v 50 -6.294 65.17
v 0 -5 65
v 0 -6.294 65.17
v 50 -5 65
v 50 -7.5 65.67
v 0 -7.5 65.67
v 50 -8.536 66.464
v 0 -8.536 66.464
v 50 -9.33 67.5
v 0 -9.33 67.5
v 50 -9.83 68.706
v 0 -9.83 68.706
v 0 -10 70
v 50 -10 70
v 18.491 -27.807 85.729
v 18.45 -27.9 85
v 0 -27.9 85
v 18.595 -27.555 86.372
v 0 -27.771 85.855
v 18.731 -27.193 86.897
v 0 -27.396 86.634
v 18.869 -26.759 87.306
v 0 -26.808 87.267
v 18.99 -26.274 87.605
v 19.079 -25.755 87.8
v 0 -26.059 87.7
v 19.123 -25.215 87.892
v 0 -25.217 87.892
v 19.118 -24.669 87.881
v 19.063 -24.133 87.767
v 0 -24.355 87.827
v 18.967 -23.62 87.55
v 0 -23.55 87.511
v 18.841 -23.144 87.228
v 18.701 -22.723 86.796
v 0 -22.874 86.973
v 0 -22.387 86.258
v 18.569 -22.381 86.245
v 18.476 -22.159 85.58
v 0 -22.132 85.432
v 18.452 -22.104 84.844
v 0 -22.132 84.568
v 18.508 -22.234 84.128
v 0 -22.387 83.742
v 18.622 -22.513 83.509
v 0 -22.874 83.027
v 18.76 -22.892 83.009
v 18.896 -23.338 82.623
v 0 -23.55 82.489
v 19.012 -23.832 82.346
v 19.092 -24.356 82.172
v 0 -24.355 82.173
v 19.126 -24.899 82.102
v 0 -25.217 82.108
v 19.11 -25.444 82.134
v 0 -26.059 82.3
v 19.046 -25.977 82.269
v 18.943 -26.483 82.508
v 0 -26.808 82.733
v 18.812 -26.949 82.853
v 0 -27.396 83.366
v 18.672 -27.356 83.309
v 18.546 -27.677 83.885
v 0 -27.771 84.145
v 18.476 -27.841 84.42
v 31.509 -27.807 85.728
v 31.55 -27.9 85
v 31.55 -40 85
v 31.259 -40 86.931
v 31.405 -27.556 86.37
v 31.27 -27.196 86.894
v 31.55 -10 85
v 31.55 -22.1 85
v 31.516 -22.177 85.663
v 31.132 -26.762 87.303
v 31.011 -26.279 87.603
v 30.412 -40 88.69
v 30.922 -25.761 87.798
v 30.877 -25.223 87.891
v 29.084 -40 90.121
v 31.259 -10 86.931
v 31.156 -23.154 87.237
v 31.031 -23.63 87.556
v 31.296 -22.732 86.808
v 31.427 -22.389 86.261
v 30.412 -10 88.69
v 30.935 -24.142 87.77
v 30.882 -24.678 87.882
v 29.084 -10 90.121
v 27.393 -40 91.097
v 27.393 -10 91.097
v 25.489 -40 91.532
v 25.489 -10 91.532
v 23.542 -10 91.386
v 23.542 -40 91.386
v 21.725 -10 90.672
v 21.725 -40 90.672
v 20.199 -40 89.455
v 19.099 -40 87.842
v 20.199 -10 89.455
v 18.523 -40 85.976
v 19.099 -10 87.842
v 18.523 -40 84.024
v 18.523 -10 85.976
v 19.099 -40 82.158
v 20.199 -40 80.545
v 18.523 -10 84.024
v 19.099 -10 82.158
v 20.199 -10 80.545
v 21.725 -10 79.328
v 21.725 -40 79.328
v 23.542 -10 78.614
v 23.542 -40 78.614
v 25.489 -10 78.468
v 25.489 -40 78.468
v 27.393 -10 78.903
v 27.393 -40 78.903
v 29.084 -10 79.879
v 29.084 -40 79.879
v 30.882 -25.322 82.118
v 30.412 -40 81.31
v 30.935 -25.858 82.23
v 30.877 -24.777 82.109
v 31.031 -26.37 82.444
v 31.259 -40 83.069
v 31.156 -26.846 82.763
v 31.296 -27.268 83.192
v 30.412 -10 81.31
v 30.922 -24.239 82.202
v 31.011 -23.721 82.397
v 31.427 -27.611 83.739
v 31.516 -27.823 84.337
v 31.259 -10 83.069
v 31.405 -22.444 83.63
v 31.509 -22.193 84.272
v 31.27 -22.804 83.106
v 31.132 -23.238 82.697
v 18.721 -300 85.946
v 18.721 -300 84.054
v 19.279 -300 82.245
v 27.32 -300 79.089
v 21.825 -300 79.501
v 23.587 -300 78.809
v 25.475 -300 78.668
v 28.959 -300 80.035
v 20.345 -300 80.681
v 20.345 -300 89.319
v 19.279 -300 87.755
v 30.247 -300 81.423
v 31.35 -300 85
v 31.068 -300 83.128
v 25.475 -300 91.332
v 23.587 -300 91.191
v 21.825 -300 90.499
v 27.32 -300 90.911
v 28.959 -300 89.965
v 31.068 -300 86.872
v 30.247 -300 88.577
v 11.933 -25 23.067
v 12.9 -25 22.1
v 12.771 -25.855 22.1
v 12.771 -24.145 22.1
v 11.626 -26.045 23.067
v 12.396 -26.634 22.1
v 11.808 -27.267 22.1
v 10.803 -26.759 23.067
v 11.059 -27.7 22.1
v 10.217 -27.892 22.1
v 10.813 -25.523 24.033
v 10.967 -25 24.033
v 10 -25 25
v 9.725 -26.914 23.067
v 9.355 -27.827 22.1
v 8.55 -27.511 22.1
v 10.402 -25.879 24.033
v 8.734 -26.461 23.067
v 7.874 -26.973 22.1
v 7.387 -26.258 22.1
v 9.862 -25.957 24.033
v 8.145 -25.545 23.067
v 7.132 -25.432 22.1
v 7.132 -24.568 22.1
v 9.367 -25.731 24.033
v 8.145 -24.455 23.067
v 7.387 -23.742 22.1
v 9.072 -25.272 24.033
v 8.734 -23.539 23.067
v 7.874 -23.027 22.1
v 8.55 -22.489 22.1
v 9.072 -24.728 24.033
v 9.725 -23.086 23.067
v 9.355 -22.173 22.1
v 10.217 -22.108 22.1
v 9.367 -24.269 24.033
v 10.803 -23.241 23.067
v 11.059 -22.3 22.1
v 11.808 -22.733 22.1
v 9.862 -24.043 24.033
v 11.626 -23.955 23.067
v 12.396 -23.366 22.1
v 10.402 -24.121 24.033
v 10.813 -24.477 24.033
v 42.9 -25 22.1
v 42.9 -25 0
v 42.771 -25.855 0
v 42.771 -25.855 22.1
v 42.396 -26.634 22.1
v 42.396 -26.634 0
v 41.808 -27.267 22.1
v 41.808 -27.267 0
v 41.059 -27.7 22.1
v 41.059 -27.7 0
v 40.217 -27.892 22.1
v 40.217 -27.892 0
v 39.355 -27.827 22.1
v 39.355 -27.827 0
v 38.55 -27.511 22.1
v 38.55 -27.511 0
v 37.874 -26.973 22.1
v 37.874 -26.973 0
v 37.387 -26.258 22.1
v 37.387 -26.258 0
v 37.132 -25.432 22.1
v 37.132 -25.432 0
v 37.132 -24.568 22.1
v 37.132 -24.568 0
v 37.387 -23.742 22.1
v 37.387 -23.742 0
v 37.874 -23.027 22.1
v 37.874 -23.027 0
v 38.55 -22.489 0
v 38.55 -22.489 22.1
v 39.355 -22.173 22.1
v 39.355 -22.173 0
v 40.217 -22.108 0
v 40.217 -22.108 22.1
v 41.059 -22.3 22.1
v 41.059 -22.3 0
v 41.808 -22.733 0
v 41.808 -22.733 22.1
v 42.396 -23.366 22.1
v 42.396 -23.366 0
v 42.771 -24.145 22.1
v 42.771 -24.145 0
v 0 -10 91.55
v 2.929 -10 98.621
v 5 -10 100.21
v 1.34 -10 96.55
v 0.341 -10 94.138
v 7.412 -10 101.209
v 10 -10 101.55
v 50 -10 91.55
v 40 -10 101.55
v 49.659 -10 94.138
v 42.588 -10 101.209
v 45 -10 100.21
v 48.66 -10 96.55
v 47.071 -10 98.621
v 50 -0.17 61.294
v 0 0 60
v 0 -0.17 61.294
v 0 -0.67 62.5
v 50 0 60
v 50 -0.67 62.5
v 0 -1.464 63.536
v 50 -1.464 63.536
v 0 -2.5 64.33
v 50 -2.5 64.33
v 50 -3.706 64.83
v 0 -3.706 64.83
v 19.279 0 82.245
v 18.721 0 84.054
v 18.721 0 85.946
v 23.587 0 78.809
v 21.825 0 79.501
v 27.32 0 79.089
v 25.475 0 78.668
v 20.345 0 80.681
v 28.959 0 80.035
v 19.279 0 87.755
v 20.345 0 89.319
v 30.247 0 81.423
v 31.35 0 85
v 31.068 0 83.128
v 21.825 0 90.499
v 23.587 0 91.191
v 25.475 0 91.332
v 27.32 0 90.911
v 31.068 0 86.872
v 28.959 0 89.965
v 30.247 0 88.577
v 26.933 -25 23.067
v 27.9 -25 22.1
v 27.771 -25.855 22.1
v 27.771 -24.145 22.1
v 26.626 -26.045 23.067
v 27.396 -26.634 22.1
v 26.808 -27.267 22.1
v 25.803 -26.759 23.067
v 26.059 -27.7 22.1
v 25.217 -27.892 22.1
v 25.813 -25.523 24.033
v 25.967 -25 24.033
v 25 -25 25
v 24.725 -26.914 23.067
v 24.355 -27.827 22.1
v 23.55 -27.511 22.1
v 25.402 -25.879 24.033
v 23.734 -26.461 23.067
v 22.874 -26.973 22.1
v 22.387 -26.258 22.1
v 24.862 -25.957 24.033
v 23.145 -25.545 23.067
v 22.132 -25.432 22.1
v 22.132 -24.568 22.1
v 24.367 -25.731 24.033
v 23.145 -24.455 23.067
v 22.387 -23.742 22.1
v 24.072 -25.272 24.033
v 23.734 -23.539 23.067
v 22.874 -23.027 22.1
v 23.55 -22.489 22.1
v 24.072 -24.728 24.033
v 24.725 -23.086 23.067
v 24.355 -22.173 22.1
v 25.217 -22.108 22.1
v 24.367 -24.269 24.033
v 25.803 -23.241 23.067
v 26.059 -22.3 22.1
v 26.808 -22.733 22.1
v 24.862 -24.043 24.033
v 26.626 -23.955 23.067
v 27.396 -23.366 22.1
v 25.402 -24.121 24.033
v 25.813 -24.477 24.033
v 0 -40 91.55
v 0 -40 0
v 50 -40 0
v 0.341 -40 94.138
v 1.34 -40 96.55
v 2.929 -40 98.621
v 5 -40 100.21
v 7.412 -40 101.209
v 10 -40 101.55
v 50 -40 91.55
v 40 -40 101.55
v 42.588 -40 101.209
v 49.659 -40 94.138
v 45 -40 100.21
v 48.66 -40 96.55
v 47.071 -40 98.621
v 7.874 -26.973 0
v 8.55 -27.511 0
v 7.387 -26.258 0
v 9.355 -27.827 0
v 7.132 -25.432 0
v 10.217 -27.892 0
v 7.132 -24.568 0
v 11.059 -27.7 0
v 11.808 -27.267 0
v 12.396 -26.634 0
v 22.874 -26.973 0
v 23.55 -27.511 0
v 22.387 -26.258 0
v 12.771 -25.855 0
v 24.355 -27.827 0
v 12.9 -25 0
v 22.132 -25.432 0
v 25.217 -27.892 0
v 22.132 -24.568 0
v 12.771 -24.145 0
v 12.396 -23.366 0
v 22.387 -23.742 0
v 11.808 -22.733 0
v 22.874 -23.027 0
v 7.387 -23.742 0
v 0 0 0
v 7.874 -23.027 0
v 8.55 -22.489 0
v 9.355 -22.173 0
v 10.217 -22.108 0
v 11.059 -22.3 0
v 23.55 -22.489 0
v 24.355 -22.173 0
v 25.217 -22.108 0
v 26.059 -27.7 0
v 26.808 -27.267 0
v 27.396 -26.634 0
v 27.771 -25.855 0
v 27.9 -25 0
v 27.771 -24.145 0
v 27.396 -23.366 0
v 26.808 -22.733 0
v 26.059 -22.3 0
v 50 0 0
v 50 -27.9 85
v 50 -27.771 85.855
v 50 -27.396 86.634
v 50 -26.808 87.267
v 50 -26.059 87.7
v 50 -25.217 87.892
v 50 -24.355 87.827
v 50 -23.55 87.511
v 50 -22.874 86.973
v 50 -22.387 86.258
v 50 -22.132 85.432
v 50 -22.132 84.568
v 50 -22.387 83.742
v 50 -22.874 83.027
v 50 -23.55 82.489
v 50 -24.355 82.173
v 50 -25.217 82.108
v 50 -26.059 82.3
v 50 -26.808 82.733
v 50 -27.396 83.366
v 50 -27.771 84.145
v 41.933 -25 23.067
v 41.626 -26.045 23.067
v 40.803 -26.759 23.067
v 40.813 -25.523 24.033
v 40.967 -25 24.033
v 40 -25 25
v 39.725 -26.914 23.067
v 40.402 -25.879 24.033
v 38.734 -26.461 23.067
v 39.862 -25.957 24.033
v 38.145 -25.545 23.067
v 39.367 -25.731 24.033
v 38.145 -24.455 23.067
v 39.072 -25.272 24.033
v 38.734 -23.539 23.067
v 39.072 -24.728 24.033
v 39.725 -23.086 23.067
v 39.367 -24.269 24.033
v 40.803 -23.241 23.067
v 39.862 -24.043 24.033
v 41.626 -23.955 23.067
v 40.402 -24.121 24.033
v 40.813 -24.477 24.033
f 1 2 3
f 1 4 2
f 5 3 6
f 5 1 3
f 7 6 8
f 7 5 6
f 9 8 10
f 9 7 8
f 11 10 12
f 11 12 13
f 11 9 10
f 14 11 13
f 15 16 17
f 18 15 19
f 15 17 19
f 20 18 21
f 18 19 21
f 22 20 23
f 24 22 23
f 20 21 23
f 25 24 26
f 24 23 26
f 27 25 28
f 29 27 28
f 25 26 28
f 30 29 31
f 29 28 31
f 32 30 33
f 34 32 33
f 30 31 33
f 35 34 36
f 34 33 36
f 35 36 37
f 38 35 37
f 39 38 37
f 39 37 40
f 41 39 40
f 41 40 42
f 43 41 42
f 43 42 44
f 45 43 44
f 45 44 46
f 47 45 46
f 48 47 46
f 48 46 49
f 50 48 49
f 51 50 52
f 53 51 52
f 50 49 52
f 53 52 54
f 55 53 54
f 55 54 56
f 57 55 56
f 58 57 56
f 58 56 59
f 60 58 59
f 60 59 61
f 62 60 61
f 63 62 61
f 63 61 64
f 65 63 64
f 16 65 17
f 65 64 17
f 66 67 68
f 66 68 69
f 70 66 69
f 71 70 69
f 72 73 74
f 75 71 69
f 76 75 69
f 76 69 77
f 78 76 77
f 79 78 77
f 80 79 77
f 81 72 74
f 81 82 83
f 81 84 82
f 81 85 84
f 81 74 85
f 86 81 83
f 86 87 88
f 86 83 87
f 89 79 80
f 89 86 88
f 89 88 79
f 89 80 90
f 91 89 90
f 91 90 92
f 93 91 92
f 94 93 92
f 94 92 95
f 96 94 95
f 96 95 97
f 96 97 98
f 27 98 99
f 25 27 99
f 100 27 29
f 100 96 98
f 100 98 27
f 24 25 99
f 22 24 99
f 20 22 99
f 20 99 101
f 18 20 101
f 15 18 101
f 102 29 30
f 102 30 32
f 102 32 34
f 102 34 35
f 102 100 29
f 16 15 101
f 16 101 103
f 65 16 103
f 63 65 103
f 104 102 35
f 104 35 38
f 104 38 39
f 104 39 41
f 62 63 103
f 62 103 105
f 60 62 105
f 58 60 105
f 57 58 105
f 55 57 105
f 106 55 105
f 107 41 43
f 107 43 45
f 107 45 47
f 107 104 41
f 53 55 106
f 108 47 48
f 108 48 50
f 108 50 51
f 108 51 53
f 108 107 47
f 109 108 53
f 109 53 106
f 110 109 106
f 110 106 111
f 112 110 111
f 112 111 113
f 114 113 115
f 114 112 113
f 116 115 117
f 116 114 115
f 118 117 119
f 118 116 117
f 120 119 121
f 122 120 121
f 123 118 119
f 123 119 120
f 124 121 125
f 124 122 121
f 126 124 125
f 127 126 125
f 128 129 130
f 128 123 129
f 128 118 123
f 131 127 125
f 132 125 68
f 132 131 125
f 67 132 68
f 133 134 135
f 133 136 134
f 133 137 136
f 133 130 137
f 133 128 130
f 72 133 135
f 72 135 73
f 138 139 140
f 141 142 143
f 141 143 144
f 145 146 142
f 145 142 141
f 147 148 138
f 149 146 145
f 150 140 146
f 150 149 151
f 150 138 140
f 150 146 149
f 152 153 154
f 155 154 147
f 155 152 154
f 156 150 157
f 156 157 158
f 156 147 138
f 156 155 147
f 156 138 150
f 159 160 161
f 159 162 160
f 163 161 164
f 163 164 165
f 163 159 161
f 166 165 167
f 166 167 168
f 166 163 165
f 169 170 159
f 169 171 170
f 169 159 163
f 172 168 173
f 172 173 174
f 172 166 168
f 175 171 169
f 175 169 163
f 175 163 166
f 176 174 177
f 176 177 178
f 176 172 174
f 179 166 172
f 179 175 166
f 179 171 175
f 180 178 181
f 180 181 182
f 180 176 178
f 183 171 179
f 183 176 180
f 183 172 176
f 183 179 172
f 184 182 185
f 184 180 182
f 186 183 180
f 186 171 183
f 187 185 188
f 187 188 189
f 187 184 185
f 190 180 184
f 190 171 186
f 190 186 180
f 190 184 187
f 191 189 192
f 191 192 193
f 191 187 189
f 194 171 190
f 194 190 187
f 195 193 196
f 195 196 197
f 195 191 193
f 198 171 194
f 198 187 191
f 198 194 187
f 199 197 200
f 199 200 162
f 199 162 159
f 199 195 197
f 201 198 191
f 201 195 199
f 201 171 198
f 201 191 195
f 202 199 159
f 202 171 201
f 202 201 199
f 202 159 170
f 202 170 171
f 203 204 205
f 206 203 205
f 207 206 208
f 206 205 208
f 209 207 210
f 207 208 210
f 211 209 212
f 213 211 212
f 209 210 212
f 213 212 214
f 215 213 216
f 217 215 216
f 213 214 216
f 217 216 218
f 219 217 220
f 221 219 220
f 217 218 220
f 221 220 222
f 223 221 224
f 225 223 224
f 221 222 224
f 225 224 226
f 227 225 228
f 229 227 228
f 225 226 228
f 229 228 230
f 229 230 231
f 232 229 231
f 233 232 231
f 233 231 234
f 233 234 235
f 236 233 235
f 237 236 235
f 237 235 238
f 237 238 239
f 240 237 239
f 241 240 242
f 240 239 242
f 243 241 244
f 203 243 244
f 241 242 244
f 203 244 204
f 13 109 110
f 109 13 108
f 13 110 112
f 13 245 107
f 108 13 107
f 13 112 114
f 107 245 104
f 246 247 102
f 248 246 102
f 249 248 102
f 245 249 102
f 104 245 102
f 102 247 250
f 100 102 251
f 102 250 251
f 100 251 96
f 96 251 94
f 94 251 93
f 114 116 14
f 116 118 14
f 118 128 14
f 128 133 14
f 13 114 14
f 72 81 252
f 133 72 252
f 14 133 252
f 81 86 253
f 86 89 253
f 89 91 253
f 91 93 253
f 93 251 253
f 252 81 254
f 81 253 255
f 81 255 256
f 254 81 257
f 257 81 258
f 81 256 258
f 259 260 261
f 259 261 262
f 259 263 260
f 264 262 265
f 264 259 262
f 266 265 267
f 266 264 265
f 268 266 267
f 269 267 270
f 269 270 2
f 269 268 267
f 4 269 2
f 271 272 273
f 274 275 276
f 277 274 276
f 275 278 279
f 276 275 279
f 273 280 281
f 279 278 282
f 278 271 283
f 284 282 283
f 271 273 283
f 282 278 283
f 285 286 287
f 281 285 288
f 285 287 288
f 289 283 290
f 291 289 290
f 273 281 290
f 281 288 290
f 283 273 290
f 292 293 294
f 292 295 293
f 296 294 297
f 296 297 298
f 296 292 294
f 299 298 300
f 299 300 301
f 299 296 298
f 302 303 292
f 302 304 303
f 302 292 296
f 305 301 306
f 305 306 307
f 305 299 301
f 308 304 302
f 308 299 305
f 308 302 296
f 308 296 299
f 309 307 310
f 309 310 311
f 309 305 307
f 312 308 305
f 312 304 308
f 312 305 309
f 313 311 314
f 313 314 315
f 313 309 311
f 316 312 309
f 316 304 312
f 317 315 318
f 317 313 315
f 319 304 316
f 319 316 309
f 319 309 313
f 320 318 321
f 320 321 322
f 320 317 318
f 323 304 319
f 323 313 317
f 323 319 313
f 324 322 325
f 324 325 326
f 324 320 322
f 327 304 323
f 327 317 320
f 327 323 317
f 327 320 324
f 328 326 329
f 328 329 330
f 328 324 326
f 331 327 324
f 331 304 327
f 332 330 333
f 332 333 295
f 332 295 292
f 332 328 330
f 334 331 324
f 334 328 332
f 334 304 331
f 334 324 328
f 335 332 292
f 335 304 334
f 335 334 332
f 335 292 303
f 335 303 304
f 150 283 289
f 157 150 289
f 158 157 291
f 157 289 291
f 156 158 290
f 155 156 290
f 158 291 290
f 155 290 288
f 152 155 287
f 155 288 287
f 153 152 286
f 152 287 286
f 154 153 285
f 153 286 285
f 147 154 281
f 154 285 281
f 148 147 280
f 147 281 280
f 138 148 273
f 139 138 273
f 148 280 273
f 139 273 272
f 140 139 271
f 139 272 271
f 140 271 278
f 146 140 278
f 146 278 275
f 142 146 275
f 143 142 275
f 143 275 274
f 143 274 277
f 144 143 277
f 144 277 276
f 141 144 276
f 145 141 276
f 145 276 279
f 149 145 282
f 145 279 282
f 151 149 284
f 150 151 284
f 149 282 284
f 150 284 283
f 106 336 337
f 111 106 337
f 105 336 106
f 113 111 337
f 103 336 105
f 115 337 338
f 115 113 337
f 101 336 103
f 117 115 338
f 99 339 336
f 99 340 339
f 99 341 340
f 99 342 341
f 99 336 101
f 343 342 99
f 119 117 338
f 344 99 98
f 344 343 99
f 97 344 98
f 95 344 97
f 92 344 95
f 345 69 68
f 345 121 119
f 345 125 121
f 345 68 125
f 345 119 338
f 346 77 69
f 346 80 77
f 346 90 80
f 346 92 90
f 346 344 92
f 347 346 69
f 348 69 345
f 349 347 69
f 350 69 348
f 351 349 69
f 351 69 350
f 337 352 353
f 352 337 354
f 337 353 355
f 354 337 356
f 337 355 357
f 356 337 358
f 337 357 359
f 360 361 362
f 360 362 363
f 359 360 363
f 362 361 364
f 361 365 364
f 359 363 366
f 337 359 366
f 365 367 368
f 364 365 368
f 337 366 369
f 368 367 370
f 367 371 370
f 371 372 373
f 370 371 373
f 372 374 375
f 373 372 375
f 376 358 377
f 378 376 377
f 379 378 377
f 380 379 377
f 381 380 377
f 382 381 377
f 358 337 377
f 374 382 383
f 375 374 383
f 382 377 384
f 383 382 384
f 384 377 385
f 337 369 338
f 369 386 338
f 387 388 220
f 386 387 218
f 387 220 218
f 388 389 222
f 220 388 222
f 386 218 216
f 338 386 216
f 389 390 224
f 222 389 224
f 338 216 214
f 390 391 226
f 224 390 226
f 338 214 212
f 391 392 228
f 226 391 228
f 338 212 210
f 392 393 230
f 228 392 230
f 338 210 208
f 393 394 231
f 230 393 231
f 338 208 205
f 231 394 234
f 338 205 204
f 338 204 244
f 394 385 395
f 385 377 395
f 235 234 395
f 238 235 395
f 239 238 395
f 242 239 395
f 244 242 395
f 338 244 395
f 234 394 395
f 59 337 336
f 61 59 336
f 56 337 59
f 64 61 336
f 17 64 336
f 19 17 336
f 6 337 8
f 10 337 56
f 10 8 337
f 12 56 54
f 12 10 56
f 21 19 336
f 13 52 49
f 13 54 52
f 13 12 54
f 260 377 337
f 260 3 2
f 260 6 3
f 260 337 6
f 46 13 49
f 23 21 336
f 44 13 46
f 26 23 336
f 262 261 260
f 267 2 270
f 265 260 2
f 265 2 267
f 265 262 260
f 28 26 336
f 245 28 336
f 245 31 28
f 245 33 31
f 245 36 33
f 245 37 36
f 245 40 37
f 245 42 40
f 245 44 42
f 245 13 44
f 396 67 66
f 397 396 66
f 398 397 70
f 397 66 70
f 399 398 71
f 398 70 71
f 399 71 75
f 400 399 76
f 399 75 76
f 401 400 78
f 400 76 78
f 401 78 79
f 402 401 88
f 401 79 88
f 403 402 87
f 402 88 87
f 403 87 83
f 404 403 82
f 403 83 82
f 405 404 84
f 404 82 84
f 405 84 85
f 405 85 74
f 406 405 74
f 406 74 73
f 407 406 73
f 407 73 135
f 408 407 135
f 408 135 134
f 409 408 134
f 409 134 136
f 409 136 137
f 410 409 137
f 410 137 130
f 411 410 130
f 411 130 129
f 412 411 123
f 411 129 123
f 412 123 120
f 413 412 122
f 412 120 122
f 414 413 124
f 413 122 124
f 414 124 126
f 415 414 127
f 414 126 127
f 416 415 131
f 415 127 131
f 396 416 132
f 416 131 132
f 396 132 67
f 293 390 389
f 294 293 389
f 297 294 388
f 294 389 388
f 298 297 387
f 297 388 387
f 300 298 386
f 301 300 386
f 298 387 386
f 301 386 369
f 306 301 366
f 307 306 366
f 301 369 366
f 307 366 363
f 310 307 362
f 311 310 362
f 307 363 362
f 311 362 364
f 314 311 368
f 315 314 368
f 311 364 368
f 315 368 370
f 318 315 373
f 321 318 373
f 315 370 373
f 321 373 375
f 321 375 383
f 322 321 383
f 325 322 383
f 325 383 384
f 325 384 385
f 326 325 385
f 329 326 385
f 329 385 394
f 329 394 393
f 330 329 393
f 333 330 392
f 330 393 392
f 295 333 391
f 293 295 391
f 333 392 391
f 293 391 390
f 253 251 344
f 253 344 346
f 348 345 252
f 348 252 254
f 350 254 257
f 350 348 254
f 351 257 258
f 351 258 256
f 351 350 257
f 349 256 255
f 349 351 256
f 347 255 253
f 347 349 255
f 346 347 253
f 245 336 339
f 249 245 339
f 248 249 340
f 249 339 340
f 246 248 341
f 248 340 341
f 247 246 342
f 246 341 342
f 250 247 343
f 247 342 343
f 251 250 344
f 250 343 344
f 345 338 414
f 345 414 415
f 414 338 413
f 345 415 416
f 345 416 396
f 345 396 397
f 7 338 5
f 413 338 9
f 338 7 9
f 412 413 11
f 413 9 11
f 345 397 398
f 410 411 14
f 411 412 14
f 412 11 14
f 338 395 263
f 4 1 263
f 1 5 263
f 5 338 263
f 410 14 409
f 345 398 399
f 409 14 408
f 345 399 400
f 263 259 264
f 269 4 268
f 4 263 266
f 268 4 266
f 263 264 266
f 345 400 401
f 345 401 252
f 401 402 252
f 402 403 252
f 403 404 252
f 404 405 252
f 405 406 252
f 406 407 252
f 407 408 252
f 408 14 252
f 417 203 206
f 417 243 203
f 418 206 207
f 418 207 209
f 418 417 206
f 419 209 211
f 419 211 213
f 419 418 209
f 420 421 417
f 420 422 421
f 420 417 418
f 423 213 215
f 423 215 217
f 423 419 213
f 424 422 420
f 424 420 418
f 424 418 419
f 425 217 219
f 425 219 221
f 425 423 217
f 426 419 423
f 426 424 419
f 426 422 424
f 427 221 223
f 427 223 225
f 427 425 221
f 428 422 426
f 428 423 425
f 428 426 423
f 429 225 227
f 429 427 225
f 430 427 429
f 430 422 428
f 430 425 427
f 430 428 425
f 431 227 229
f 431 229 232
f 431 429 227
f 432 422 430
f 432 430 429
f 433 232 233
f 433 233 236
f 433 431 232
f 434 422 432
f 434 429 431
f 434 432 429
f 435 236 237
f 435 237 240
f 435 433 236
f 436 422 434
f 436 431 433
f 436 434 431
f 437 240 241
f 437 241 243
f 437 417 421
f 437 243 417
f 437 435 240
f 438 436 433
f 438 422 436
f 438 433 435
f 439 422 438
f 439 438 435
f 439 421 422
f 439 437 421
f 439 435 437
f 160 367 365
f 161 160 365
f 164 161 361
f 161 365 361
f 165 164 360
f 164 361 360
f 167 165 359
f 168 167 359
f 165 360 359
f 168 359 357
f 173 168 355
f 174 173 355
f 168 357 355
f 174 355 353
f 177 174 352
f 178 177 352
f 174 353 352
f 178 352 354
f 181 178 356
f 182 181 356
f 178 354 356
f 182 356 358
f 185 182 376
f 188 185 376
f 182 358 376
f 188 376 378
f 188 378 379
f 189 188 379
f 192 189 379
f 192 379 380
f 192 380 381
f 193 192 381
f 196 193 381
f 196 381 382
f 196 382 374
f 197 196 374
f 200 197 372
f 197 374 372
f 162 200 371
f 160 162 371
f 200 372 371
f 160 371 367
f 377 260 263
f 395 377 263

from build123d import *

# Parameters (mm, degrees)
F0_W      = 50
F0_H      = 101.55
F0_R      = 6.55
F1_DEPTH  = 40
F3_R      = 2.9
F4_DEPTH  = 50.001
F5_R      = 2.9
F6_DEPTH  = 25
F7_SIZE   = 2.9
F8_R      = 10
F9_W      = 50
F9_H      = 36.55
F9_R      = 6.55
F10_DEPTH = 10
F11_R     = 4.99999
F0_R_2    = 6.35
F12_DEPTH = 300


# Not quite as in the source:
# - a fillet or chamfer is up to 0.001 mm smaller than in the source, because OpenCascade refuses the exact size


with BuildPart() as f1:
    # F0 (on Front) → F1 (new body)
    with BuildSketch(Plane.XZ):
        with Locations((25, 50.775)):
            Rectangle(F0_W, F0_H)
        with Locations((25, 85)):
            Circle(F0_R, mode=Mode.SUBTRACT)
    extrude(amount=F1_DEPTH)

    # F3 (on face) → F4 (cut, through all)
    with BuildSketch(Plane(origin=(0, 0, 0), x_dir=(0, -1, 0), z_dir=(-1, 0, 0))):
        with Locations((25, 85)):
            Circle(F3_R)
    extrude(amount=-F4_DEPTH, mode=Mode.SUBTRACT)

    # F5 (on face) → F6 (cut)
    with BuildSketch(Plane(origin=(0, 0, 0), x_dir=(1, 0, 0), z_dir=(0, 0, -1))):
        with Locations((10, 25)):
            Circle(F5_R)
        with Locations((25, 25)):
            Circle(F5_R)
        with Locations((40, 25)):
            Circle(F5_R)
    extrude(amount=-F6_DEPTH, mode=Mode.SUBTRACT)

    # F7
    f7_edges = [f1.edges().sort_by_distance(p)[0] for p in [
        (22.1, -25, 25),
        (7.1, -25, 25),
        (37.1, -25, 25),
    ]]
    chamfer(f7_edges, length=F7_SIZE)

    # F8
    f8_edges = [f1.edges().sort_by_distance(p)[0] for p in [
        (50, -20, 101.55),
        (0, -20, 101.55),
    ]]
    fillet(f8_edges, radius=F8_R)

    # F9 (on face) → F10 (cut)
    with BuildSketch(Plane.XZ):
        with Locations((25, 83.275)):
            Rectangle(F9_W, F9_H)
        with Locations((25, 85)):
            Circle(F9_R, mode=Mode.SUBTRACT)
    extrude(amount=F10_DEPTH, mode=Mode.SUBTRACT)

    # F11 (radius 5 in the source; OpenCascade refuses exactly that, so slightly less here)
    f11_edges = [f1.edges().sort_by_distance(p)[0] for p in [
        (25, -10, 65),
        (25, 0, 65),
    ]]
    fillet(f11_edges, radius=F11_R)


with BuildPart() as f12:
    # F0 (on Front) → F12 (new body)
    with BuildSketch(Plane.XZ):
        with Locations((25, 85)):
            Circle(F0_R_2)
    extrude(amount=F12_DEPTH)


solid = Compound([f1.part, f12.part])
